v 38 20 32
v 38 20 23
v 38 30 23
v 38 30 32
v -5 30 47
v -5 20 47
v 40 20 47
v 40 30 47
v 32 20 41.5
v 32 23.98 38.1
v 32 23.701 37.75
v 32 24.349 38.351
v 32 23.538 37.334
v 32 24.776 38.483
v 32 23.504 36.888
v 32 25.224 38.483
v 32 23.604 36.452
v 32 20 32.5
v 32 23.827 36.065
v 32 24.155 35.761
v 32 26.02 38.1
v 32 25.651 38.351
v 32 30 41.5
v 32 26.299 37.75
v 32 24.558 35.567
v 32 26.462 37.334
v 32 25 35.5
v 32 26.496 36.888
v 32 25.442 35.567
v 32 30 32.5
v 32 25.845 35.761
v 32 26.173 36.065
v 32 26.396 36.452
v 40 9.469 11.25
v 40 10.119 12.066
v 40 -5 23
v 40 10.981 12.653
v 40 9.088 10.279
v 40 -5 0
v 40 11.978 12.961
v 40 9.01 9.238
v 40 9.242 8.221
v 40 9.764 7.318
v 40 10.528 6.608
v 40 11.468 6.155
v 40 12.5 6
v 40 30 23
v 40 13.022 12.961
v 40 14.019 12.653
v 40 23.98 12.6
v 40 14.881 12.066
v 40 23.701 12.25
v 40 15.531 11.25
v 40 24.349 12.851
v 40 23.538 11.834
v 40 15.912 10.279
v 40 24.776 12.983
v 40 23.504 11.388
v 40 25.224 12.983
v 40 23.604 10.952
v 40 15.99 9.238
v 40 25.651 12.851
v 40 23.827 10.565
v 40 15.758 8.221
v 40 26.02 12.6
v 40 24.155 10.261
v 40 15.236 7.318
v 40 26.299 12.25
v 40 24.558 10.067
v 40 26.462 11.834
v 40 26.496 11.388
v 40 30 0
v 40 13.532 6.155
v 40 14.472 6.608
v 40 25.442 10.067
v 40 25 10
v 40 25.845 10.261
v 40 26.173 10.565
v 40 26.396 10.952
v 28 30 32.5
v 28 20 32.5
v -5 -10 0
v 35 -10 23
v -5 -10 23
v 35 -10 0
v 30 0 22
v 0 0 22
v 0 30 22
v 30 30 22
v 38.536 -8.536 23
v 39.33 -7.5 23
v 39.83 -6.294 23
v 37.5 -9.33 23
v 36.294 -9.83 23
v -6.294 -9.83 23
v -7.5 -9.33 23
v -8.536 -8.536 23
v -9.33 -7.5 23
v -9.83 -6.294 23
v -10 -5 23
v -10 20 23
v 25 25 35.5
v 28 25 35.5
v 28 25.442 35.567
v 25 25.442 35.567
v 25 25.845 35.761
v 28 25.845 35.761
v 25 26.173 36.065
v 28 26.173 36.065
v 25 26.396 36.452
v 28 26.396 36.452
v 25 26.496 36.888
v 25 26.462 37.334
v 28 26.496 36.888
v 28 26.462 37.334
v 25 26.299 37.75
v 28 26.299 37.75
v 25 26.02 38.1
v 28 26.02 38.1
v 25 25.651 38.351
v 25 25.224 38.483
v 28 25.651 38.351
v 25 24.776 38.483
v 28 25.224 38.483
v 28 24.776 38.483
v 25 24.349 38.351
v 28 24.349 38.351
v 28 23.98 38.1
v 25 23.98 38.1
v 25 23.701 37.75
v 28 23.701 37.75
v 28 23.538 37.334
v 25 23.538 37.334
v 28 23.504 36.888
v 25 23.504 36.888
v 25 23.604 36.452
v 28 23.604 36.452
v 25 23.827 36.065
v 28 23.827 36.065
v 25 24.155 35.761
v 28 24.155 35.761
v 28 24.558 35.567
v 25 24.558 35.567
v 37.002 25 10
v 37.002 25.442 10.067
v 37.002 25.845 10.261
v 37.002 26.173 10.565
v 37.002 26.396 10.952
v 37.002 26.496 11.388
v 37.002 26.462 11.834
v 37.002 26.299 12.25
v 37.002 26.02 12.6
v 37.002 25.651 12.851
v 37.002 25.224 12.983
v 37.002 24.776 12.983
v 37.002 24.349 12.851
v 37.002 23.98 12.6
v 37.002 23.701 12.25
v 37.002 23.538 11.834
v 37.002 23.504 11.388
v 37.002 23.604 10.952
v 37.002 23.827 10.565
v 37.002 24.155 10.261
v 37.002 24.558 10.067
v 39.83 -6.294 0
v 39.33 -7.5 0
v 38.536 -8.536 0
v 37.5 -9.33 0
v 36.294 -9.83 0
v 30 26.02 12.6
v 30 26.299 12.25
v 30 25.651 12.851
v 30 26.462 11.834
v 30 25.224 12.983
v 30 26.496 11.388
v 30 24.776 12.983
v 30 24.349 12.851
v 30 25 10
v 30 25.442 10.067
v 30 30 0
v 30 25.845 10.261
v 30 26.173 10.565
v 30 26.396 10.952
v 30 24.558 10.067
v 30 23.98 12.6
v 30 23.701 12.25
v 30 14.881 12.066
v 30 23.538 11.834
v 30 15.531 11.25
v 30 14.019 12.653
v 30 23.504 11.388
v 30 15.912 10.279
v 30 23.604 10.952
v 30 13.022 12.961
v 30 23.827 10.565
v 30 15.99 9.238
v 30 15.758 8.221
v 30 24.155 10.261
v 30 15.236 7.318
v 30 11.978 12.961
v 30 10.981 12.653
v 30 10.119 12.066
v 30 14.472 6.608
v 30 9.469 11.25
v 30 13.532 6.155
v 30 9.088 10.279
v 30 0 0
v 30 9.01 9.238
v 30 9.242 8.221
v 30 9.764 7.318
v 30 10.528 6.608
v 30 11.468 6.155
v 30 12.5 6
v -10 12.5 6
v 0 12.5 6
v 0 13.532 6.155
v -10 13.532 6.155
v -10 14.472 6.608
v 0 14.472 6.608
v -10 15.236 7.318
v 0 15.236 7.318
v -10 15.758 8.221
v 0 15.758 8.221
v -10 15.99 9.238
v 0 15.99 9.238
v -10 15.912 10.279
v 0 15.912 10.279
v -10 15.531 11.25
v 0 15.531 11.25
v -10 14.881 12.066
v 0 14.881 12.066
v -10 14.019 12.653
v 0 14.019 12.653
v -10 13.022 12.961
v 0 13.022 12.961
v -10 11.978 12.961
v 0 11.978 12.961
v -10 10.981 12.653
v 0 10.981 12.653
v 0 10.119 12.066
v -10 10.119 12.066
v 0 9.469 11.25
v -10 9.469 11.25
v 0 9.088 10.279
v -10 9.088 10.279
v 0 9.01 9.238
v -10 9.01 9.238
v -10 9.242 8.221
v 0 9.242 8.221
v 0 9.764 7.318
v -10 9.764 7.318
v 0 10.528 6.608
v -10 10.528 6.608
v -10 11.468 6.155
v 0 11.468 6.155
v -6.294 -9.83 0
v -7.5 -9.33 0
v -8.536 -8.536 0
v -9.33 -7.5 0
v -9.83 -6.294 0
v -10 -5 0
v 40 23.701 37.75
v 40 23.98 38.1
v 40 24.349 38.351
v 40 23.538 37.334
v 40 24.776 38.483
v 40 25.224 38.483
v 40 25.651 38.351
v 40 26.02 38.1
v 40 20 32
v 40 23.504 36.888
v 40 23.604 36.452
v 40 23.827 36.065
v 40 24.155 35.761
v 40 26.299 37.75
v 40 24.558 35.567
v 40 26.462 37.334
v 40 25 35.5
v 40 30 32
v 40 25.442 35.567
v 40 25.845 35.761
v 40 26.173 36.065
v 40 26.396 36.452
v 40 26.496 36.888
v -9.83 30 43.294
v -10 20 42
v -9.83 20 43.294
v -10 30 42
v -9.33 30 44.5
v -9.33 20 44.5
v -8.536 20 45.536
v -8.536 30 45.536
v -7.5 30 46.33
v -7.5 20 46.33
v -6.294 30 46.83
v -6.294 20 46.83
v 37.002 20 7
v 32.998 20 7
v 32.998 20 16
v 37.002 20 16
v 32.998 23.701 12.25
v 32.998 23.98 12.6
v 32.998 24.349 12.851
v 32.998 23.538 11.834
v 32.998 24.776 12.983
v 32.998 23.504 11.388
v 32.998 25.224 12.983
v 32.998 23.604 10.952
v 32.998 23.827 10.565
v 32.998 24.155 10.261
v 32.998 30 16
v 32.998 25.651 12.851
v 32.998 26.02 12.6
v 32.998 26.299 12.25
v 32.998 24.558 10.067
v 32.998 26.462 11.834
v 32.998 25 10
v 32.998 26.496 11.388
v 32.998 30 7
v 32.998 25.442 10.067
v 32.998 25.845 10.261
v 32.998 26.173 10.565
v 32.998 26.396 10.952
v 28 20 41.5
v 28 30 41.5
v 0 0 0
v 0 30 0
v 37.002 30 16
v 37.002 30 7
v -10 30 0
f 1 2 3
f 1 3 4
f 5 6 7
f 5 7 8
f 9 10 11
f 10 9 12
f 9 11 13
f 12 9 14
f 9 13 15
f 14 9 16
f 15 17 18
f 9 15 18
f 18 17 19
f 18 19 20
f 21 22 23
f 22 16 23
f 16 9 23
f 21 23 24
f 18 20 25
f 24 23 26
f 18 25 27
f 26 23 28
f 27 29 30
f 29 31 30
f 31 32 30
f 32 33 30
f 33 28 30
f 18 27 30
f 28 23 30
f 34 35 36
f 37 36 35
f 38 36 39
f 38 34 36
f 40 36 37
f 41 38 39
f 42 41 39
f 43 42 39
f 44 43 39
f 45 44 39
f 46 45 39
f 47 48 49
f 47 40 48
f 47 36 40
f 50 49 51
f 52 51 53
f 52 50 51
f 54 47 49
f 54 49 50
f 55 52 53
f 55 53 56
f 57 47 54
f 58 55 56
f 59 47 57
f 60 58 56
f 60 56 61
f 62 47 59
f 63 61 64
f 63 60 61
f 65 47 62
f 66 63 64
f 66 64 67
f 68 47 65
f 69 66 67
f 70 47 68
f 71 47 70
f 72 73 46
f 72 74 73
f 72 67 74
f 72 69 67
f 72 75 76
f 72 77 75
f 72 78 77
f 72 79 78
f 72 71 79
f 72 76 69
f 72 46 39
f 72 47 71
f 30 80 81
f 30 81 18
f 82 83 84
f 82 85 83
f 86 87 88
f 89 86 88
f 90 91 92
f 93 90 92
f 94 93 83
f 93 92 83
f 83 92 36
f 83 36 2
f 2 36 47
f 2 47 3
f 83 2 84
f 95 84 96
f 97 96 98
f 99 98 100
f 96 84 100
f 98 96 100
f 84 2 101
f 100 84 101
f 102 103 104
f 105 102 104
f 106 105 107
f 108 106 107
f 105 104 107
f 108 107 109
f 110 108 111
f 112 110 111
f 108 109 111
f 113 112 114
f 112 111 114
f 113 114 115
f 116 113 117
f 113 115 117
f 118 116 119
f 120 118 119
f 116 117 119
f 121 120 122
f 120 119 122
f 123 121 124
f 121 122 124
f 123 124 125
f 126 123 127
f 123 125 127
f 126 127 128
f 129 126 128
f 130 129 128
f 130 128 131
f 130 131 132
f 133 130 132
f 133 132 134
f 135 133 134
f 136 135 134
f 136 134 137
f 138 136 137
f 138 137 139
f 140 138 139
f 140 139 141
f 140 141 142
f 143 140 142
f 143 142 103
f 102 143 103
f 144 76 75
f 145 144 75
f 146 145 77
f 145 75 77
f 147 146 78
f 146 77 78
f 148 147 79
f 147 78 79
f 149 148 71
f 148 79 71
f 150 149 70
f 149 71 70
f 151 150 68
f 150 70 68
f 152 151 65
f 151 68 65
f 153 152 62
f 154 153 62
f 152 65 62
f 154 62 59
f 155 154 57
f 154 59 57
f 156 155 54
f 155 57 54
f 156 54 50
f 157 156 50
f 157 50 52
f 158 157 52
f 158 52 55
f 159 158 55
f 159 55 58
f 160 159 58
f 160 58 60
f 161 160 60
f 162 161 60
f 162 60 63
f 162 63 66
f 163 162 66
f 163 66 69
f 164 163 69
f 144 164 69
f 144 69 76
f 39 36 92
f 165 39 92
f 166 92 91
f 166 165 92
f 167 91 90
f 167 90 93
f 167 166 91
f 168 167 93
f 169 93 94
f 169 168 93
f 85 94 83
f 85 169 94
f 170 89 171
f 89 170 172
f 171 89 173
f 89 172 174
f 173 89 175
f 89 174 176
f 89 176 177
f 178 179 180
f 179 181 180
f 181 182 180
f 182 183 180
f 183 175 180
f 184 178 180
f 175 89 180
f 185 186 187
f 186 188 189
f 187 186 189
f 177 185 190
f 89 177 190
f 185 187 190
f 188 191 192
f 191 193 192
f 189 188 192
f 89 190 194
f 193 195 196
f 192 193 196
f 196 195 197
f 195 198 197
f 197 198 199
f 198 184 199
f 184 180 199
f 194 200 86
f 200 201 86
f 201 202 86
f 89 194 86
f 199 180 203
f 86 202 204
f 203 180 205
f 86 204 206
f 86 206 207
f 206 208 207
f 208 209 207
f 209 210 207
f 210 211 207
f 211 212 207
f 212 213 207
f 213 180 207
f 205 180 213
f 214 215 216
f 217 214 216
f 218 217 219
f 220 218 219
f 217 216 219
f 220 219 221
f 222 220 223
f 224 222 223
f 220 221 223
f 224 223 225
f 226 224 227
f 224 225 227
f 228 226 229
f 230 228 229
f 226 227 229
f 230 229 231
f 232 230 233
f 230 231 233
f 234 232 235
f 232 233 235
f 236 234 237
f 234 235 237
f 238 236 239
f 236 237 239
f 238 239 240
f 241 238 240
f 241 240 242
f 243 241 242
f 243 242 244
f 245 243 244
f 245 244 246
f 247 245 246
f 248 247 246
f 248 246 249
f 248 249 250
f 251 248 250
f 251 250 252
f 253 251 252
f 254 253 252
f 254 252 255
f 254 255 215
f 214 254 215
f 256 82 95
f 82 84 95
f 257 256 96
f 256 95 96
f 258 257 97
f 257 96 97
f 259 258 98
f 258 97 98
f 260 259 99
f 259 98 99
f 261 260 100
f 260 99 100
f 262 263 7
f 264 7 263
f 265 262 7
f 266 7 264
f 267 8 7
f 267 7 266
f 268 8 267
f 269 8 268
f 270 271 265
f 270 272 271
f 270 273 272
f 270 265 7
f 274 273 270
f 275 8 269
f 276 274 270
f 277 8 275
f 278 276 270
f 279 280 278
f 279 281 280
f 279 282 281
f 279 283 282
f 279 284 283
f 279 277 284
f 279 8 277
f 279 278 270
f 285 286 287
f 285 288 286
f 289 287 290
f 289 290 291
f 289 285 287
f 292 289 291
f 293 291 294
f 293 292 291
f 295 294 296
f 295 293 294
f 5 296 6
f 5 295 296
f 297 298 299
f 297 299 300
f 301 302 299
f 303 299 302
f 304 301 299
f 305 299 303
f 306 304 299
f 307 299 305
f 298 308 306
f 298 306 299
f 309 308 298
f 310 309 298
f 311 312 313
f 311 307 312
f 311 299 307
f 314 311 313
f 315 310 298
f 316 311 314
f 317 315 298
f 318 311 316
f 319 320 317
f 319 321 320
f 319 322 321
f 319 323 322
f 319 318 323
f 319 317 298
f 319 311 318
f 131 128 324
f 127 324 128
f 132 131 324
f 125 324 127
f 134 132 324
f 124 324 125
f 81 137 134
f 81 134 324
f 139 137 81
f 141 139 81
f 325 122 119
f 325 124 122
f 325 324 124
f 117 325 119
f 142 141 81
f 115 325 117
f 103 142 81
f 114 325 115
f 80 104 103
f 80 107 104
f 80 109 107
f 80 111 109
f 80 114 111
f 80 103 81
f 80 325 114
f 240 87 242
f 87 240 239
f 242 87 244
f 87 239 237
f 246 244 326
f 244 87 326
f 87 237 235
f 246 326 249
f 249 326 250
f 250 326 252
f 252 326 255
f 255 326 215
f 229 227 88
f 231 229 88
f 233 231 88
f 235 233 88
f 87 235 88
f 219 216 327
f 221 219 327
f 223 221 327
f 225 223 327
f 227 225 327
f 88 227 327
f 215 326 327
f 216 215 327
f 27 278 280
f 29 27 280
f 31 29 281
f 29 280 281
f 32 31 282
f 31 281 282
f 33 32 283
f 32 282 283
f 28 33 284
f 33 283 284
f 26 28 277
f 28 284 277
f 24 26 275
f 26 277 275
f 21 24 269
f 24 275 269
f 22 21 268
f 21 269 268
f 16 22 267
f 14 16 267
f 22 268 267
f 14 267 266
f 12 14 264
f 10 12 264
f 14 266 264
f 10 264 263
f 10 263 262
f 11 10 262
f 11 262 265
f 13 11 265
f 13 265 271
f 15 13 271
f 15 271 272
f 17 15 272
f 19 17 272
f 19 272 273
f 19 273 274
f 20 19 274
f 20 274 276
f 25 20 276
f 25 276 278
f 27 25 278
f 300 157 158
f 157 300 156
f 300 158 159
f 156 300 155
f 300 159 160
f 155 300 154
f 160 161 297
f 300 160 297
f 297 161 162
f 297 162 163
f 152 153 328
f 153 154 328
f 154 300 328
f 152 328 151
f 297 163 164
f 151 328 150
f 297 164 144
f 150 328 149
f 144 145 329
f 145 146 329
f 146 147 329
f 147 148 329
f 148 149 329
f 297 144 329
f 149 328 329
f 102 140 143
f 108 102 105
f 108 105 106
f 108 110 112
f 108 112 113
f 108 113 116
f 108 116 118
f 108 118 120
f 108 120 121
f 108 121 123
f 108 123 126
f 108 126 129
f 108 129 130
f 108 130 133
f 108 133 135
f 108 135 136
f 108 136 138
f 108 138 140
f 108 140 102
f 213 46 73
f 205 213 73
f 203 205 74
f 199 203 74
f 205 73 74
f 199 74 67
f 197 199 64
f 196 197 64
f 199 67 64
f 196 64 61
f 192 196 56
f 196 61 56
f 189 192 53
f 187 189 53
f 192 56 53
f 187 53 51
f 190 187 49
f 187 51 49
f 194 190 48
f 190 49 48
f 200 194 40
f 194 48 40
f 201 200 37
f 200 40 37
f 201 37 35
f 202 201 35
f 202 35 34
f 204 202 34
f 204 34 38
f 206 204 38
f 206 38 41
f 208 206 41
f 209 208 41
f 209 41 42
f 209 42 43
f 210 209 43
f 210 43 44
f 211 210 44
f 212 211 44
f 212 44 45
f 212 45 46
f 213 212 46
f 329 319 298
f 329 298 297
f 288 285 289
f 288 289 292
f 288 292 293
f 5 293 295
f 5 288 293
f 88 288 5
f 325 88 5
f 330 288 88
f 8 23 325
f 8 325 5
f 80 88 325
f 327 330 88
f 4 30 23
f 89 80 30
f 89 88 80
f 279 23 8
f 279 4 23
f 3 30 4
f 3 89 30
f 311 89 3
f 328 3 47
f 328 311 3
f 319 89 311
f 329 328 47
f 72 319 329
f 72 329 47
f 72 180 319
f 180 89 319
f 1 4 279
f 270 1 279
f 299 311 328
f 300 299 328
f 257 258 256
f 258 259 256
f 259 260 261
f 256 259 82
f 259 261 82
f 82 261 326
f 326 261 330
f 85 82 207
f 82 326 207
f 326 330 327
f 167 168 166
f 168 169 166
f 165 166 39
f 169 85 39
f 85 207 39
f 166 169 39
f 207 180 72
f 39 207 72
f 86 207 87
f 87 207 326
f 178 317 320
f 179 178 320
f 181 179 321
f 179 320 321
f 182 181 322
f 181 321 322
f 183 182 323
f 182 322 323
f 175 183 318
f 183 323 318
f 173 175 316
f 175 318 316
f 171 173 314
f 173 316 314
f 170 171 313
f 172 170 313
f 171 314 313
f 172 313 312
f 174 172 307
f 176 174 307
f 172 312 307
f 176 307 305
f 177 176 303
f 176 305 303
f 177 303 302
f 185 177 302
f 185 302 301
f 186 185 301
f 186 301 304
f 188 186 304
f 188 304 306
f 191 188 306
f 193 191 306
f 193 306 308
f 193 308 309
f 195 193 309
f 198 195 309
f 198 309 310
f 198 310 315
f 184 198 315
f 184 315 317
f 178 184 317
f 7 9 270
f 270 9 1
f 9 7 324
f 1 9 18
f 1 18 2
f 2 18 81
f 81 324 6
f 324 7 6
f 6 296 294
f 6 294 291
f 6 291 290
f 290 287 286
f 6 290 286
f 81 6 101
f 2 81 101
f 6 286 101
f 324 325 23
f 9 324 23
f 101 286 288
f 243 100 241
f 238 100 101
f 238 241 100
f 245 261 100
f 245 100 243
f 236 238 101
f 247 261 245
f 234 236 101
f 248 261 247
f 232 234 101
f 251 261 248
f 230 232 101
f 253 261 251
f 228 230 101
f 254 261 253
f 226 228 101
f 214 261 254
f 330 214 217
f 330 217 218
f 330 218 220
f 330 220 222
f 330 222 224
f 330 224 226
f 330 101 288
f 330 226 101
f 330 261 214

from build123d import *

# Parameters (mm, degrees)
BOSS_EXTRUDE1_DEPTH = 22
SKETCH3_W           = 10
SKETCH3_H           = 10
BOSS_EXTRUDE2_DEPTH = 25
SKETCH4_W           = 25
SKETCH4_H           = 10
BOSS_EXTRUDE3_DEPTH = 40
SKETCH5_W           = 2
SKETCH5_H           = 10
CUT_EXTRUDE4_DEPTH  = 40
BOSS_EXTRUDE4_DEPTH = 1
SKETCH7_R           = 1.5
CUT_EXTRUDE5_DEPTH  = 15
SKETCH8_W           = 4
SKETCH8_H           = 9
CUT_EXTRUDE6_DEPTH  = 15
FILLET1_R           = 5
FILLET2_R           = 5
FILLET3_R           = 5
SKETCH9_R           = 3.5
CUT_EXTRUDE7_DEPTH  = 1000
SKETCH10_W          = 4
SKETCH10_H          = 9
BOSS_EXTRUDE5_DEPTH = 15
SKETCH11_R          = 1.5
BOSS_EXTRUDE6_DEPTH = 10
SKETCH12_R          = 1.5
CUT_EXTRUDE8_DEPTH  = 19
SKETCH13_W          = 4.004831452
SKETCH13_H          = 9
CUT_EXTRUDE9_DEPTH  = 10


with BuildPart() as part:
    # Sketch1 → Boss-Extrude1 (new body)
    with BuildSketch(Plane.XY):
        Polygon((0, 30), (-10, 30), (-10, -10), (40, -10), (40, 30), (30, 30), (30, 0), (0, 0), align=None)
    extrude(amount=BOSS_EXTRUDE1_DEPTH)

    # Sketch3 → Boss-Extrude2 (add)
    with BuildSketch(Plane.XY.offset(22)):
        with Locations((-5, 25)):
            Rectangle(SKETCH3_W, SKETCH3_H)
    extrude(amount=BOSS_EXTRUDE2_DEPTH)

    # Sketch4 → Boss-Extrude3 (add)
    with BuildSketch(Plane(origin=(0, 0, 0), x_dir=(0, 0, -1), z_dir=(1, 0, 0))):
        with Locations((-34.5, 25)):
            Rectangle(SKETCH4_W, SKETCH4_H)
    extrude(amount=BOSS_EXTRUDE3_DEPTH)

    # Sketch5 → Cut-Extrude4 (cut)
    with BuildSketch(Plane.XZ.offset(-20)):
        with Locations((39, 27)):
            Rectangle(SKETCH5_W, SKETCH5_H)
    extrude(amount=-CUT_EXTRUDE4_DEPTH, mode=Mode.SUBTRACT)

    # Sketch6 → Boss-Extrude4 (add)
    with BuildSketch(Plane.XY.offset(22)):
        Polygon((-10, 20), (38, 20), (38, 30), (40, 30), (40, -10), (-10, -10), align=None)
    extrude(amount=BOSS_EXTRUDE4_DEPTH)

    # Sketch7 → Cut-Extrude5 (cut)
    with BuildSketch(Plane(origin=(40, 0, 0), x_dir=(0, 0, -1), z_dir=(1, 0, 0))):
        with Locations((-37, 25)):
            Circle(SKETCH7_R)
        with Locations((-17, 25)):
            Circle(SKETCH7_R)
    extrude(amount=-CUT_EXTRUDE5_DEPTH, mode=Mode.SUBTRACT)

    # Sketch8 → Cut-Extrude6 (cut)
    with BuildSketch(Plane(origin=(0, 30, 0), x_dir=(1, 0, 0), z_dir=(0, 1, 0))):
        with Locations((35, -17)):
            Rectangle(SKETCH8_W, SKETCH8_H)
        with Locations((30, -37)):
            Rectangle(SKETCH8_W, SKETCH8_H)
    extrude(amount=-CUT_EXTRUDE6_DEPTH, mode=Mode.SUBTRACT)

    # Fillet1
    fillet1_edges = [part.edges().sort_by_distance(p)[0] for p in [
        (40, -10, 11.5),
    ]]
    fillet(fillet1_edges, radius=FILLET1_R)

    # Fillet2
    fillet2_edges = [part.edges().sort_by_distance(p)[0] for p in [
        (-10, -10, 11.5),
    ]]
    fillet(fillet2_edges, radius=FILLET2_R)

    # Fillet3
    fillet3_edges = [part.edges().sort_by_distance(p)[0] for p in [
        (-10, 25, 47),
    ]]
    fillet(fillet3_edges, radius=FILLET3_R)

    # Sketch9 → Cut-Extrude7 (cut)
    with BuildSketch(Plane(origin=(40, 0, 0), x_dir=(0, 0, -1), z_dir=(1, 0, 0))):
        with Locations((-9.5, 12.5)):
            Circle(SKETCH9_R)
    extrude(amount=-CUT_EXTRUDE7_DEPTH, mode=Mode.SUBTRACT)

    # Sketch10 → Boss-Extrude5 (add)
    with BuildSketch(Plane(origin=(0, 30, 0), x_dir=(1, 0, 0), z_dir=(0, 1, 0))):
        with Locations((35, -17)):
            Rectangle(SKETCH10_W, SKETCH10_H)
    extrude(amount=-BOSS_EXTRUDE5_DEPTH)

    # Sketch11 → Boss-Extrude6 (add)
    with BuildSketch(Plane(origin=(40, 0, 0), x_dir=(0, 0, -1), z_dir=(1, 0, 0))):
        with Locations((-17, 25)):
            Circle(SKETCH11_R)
    extrude(amount=-BOSS_EXTRUDE6_DEPTH)

    # Sketch12 → Cut-Extrude8 (cut)
    with BuildSketch(Plane(origin=(40, 0, 0), x_dir=(0, 0, -1), z_dir=(1, 0, 0))):
        with Locations((-11.5, 25)):
            Circle(SKETCH12_R)
    extrude(amount=-CUT_EXTRUDE8_DEPTH, mode=Mode.SUBTRACT)

    # Sketch13 → Cut-Extrude9 (cut)
    with BuildSketch(Plane(origin=(0, 30, 0), x_dir=(1, 0, 0), z_dir=(0, 1, 0))):
        with Locations((35, -11.5)):
            Rectangle(SKETCH13_W, SKETCH13_H)
    extrude(amount=-CUT_EXTRUDE9_DEPTH, mode=Mode.SUBTRACT)


solid = part.part
